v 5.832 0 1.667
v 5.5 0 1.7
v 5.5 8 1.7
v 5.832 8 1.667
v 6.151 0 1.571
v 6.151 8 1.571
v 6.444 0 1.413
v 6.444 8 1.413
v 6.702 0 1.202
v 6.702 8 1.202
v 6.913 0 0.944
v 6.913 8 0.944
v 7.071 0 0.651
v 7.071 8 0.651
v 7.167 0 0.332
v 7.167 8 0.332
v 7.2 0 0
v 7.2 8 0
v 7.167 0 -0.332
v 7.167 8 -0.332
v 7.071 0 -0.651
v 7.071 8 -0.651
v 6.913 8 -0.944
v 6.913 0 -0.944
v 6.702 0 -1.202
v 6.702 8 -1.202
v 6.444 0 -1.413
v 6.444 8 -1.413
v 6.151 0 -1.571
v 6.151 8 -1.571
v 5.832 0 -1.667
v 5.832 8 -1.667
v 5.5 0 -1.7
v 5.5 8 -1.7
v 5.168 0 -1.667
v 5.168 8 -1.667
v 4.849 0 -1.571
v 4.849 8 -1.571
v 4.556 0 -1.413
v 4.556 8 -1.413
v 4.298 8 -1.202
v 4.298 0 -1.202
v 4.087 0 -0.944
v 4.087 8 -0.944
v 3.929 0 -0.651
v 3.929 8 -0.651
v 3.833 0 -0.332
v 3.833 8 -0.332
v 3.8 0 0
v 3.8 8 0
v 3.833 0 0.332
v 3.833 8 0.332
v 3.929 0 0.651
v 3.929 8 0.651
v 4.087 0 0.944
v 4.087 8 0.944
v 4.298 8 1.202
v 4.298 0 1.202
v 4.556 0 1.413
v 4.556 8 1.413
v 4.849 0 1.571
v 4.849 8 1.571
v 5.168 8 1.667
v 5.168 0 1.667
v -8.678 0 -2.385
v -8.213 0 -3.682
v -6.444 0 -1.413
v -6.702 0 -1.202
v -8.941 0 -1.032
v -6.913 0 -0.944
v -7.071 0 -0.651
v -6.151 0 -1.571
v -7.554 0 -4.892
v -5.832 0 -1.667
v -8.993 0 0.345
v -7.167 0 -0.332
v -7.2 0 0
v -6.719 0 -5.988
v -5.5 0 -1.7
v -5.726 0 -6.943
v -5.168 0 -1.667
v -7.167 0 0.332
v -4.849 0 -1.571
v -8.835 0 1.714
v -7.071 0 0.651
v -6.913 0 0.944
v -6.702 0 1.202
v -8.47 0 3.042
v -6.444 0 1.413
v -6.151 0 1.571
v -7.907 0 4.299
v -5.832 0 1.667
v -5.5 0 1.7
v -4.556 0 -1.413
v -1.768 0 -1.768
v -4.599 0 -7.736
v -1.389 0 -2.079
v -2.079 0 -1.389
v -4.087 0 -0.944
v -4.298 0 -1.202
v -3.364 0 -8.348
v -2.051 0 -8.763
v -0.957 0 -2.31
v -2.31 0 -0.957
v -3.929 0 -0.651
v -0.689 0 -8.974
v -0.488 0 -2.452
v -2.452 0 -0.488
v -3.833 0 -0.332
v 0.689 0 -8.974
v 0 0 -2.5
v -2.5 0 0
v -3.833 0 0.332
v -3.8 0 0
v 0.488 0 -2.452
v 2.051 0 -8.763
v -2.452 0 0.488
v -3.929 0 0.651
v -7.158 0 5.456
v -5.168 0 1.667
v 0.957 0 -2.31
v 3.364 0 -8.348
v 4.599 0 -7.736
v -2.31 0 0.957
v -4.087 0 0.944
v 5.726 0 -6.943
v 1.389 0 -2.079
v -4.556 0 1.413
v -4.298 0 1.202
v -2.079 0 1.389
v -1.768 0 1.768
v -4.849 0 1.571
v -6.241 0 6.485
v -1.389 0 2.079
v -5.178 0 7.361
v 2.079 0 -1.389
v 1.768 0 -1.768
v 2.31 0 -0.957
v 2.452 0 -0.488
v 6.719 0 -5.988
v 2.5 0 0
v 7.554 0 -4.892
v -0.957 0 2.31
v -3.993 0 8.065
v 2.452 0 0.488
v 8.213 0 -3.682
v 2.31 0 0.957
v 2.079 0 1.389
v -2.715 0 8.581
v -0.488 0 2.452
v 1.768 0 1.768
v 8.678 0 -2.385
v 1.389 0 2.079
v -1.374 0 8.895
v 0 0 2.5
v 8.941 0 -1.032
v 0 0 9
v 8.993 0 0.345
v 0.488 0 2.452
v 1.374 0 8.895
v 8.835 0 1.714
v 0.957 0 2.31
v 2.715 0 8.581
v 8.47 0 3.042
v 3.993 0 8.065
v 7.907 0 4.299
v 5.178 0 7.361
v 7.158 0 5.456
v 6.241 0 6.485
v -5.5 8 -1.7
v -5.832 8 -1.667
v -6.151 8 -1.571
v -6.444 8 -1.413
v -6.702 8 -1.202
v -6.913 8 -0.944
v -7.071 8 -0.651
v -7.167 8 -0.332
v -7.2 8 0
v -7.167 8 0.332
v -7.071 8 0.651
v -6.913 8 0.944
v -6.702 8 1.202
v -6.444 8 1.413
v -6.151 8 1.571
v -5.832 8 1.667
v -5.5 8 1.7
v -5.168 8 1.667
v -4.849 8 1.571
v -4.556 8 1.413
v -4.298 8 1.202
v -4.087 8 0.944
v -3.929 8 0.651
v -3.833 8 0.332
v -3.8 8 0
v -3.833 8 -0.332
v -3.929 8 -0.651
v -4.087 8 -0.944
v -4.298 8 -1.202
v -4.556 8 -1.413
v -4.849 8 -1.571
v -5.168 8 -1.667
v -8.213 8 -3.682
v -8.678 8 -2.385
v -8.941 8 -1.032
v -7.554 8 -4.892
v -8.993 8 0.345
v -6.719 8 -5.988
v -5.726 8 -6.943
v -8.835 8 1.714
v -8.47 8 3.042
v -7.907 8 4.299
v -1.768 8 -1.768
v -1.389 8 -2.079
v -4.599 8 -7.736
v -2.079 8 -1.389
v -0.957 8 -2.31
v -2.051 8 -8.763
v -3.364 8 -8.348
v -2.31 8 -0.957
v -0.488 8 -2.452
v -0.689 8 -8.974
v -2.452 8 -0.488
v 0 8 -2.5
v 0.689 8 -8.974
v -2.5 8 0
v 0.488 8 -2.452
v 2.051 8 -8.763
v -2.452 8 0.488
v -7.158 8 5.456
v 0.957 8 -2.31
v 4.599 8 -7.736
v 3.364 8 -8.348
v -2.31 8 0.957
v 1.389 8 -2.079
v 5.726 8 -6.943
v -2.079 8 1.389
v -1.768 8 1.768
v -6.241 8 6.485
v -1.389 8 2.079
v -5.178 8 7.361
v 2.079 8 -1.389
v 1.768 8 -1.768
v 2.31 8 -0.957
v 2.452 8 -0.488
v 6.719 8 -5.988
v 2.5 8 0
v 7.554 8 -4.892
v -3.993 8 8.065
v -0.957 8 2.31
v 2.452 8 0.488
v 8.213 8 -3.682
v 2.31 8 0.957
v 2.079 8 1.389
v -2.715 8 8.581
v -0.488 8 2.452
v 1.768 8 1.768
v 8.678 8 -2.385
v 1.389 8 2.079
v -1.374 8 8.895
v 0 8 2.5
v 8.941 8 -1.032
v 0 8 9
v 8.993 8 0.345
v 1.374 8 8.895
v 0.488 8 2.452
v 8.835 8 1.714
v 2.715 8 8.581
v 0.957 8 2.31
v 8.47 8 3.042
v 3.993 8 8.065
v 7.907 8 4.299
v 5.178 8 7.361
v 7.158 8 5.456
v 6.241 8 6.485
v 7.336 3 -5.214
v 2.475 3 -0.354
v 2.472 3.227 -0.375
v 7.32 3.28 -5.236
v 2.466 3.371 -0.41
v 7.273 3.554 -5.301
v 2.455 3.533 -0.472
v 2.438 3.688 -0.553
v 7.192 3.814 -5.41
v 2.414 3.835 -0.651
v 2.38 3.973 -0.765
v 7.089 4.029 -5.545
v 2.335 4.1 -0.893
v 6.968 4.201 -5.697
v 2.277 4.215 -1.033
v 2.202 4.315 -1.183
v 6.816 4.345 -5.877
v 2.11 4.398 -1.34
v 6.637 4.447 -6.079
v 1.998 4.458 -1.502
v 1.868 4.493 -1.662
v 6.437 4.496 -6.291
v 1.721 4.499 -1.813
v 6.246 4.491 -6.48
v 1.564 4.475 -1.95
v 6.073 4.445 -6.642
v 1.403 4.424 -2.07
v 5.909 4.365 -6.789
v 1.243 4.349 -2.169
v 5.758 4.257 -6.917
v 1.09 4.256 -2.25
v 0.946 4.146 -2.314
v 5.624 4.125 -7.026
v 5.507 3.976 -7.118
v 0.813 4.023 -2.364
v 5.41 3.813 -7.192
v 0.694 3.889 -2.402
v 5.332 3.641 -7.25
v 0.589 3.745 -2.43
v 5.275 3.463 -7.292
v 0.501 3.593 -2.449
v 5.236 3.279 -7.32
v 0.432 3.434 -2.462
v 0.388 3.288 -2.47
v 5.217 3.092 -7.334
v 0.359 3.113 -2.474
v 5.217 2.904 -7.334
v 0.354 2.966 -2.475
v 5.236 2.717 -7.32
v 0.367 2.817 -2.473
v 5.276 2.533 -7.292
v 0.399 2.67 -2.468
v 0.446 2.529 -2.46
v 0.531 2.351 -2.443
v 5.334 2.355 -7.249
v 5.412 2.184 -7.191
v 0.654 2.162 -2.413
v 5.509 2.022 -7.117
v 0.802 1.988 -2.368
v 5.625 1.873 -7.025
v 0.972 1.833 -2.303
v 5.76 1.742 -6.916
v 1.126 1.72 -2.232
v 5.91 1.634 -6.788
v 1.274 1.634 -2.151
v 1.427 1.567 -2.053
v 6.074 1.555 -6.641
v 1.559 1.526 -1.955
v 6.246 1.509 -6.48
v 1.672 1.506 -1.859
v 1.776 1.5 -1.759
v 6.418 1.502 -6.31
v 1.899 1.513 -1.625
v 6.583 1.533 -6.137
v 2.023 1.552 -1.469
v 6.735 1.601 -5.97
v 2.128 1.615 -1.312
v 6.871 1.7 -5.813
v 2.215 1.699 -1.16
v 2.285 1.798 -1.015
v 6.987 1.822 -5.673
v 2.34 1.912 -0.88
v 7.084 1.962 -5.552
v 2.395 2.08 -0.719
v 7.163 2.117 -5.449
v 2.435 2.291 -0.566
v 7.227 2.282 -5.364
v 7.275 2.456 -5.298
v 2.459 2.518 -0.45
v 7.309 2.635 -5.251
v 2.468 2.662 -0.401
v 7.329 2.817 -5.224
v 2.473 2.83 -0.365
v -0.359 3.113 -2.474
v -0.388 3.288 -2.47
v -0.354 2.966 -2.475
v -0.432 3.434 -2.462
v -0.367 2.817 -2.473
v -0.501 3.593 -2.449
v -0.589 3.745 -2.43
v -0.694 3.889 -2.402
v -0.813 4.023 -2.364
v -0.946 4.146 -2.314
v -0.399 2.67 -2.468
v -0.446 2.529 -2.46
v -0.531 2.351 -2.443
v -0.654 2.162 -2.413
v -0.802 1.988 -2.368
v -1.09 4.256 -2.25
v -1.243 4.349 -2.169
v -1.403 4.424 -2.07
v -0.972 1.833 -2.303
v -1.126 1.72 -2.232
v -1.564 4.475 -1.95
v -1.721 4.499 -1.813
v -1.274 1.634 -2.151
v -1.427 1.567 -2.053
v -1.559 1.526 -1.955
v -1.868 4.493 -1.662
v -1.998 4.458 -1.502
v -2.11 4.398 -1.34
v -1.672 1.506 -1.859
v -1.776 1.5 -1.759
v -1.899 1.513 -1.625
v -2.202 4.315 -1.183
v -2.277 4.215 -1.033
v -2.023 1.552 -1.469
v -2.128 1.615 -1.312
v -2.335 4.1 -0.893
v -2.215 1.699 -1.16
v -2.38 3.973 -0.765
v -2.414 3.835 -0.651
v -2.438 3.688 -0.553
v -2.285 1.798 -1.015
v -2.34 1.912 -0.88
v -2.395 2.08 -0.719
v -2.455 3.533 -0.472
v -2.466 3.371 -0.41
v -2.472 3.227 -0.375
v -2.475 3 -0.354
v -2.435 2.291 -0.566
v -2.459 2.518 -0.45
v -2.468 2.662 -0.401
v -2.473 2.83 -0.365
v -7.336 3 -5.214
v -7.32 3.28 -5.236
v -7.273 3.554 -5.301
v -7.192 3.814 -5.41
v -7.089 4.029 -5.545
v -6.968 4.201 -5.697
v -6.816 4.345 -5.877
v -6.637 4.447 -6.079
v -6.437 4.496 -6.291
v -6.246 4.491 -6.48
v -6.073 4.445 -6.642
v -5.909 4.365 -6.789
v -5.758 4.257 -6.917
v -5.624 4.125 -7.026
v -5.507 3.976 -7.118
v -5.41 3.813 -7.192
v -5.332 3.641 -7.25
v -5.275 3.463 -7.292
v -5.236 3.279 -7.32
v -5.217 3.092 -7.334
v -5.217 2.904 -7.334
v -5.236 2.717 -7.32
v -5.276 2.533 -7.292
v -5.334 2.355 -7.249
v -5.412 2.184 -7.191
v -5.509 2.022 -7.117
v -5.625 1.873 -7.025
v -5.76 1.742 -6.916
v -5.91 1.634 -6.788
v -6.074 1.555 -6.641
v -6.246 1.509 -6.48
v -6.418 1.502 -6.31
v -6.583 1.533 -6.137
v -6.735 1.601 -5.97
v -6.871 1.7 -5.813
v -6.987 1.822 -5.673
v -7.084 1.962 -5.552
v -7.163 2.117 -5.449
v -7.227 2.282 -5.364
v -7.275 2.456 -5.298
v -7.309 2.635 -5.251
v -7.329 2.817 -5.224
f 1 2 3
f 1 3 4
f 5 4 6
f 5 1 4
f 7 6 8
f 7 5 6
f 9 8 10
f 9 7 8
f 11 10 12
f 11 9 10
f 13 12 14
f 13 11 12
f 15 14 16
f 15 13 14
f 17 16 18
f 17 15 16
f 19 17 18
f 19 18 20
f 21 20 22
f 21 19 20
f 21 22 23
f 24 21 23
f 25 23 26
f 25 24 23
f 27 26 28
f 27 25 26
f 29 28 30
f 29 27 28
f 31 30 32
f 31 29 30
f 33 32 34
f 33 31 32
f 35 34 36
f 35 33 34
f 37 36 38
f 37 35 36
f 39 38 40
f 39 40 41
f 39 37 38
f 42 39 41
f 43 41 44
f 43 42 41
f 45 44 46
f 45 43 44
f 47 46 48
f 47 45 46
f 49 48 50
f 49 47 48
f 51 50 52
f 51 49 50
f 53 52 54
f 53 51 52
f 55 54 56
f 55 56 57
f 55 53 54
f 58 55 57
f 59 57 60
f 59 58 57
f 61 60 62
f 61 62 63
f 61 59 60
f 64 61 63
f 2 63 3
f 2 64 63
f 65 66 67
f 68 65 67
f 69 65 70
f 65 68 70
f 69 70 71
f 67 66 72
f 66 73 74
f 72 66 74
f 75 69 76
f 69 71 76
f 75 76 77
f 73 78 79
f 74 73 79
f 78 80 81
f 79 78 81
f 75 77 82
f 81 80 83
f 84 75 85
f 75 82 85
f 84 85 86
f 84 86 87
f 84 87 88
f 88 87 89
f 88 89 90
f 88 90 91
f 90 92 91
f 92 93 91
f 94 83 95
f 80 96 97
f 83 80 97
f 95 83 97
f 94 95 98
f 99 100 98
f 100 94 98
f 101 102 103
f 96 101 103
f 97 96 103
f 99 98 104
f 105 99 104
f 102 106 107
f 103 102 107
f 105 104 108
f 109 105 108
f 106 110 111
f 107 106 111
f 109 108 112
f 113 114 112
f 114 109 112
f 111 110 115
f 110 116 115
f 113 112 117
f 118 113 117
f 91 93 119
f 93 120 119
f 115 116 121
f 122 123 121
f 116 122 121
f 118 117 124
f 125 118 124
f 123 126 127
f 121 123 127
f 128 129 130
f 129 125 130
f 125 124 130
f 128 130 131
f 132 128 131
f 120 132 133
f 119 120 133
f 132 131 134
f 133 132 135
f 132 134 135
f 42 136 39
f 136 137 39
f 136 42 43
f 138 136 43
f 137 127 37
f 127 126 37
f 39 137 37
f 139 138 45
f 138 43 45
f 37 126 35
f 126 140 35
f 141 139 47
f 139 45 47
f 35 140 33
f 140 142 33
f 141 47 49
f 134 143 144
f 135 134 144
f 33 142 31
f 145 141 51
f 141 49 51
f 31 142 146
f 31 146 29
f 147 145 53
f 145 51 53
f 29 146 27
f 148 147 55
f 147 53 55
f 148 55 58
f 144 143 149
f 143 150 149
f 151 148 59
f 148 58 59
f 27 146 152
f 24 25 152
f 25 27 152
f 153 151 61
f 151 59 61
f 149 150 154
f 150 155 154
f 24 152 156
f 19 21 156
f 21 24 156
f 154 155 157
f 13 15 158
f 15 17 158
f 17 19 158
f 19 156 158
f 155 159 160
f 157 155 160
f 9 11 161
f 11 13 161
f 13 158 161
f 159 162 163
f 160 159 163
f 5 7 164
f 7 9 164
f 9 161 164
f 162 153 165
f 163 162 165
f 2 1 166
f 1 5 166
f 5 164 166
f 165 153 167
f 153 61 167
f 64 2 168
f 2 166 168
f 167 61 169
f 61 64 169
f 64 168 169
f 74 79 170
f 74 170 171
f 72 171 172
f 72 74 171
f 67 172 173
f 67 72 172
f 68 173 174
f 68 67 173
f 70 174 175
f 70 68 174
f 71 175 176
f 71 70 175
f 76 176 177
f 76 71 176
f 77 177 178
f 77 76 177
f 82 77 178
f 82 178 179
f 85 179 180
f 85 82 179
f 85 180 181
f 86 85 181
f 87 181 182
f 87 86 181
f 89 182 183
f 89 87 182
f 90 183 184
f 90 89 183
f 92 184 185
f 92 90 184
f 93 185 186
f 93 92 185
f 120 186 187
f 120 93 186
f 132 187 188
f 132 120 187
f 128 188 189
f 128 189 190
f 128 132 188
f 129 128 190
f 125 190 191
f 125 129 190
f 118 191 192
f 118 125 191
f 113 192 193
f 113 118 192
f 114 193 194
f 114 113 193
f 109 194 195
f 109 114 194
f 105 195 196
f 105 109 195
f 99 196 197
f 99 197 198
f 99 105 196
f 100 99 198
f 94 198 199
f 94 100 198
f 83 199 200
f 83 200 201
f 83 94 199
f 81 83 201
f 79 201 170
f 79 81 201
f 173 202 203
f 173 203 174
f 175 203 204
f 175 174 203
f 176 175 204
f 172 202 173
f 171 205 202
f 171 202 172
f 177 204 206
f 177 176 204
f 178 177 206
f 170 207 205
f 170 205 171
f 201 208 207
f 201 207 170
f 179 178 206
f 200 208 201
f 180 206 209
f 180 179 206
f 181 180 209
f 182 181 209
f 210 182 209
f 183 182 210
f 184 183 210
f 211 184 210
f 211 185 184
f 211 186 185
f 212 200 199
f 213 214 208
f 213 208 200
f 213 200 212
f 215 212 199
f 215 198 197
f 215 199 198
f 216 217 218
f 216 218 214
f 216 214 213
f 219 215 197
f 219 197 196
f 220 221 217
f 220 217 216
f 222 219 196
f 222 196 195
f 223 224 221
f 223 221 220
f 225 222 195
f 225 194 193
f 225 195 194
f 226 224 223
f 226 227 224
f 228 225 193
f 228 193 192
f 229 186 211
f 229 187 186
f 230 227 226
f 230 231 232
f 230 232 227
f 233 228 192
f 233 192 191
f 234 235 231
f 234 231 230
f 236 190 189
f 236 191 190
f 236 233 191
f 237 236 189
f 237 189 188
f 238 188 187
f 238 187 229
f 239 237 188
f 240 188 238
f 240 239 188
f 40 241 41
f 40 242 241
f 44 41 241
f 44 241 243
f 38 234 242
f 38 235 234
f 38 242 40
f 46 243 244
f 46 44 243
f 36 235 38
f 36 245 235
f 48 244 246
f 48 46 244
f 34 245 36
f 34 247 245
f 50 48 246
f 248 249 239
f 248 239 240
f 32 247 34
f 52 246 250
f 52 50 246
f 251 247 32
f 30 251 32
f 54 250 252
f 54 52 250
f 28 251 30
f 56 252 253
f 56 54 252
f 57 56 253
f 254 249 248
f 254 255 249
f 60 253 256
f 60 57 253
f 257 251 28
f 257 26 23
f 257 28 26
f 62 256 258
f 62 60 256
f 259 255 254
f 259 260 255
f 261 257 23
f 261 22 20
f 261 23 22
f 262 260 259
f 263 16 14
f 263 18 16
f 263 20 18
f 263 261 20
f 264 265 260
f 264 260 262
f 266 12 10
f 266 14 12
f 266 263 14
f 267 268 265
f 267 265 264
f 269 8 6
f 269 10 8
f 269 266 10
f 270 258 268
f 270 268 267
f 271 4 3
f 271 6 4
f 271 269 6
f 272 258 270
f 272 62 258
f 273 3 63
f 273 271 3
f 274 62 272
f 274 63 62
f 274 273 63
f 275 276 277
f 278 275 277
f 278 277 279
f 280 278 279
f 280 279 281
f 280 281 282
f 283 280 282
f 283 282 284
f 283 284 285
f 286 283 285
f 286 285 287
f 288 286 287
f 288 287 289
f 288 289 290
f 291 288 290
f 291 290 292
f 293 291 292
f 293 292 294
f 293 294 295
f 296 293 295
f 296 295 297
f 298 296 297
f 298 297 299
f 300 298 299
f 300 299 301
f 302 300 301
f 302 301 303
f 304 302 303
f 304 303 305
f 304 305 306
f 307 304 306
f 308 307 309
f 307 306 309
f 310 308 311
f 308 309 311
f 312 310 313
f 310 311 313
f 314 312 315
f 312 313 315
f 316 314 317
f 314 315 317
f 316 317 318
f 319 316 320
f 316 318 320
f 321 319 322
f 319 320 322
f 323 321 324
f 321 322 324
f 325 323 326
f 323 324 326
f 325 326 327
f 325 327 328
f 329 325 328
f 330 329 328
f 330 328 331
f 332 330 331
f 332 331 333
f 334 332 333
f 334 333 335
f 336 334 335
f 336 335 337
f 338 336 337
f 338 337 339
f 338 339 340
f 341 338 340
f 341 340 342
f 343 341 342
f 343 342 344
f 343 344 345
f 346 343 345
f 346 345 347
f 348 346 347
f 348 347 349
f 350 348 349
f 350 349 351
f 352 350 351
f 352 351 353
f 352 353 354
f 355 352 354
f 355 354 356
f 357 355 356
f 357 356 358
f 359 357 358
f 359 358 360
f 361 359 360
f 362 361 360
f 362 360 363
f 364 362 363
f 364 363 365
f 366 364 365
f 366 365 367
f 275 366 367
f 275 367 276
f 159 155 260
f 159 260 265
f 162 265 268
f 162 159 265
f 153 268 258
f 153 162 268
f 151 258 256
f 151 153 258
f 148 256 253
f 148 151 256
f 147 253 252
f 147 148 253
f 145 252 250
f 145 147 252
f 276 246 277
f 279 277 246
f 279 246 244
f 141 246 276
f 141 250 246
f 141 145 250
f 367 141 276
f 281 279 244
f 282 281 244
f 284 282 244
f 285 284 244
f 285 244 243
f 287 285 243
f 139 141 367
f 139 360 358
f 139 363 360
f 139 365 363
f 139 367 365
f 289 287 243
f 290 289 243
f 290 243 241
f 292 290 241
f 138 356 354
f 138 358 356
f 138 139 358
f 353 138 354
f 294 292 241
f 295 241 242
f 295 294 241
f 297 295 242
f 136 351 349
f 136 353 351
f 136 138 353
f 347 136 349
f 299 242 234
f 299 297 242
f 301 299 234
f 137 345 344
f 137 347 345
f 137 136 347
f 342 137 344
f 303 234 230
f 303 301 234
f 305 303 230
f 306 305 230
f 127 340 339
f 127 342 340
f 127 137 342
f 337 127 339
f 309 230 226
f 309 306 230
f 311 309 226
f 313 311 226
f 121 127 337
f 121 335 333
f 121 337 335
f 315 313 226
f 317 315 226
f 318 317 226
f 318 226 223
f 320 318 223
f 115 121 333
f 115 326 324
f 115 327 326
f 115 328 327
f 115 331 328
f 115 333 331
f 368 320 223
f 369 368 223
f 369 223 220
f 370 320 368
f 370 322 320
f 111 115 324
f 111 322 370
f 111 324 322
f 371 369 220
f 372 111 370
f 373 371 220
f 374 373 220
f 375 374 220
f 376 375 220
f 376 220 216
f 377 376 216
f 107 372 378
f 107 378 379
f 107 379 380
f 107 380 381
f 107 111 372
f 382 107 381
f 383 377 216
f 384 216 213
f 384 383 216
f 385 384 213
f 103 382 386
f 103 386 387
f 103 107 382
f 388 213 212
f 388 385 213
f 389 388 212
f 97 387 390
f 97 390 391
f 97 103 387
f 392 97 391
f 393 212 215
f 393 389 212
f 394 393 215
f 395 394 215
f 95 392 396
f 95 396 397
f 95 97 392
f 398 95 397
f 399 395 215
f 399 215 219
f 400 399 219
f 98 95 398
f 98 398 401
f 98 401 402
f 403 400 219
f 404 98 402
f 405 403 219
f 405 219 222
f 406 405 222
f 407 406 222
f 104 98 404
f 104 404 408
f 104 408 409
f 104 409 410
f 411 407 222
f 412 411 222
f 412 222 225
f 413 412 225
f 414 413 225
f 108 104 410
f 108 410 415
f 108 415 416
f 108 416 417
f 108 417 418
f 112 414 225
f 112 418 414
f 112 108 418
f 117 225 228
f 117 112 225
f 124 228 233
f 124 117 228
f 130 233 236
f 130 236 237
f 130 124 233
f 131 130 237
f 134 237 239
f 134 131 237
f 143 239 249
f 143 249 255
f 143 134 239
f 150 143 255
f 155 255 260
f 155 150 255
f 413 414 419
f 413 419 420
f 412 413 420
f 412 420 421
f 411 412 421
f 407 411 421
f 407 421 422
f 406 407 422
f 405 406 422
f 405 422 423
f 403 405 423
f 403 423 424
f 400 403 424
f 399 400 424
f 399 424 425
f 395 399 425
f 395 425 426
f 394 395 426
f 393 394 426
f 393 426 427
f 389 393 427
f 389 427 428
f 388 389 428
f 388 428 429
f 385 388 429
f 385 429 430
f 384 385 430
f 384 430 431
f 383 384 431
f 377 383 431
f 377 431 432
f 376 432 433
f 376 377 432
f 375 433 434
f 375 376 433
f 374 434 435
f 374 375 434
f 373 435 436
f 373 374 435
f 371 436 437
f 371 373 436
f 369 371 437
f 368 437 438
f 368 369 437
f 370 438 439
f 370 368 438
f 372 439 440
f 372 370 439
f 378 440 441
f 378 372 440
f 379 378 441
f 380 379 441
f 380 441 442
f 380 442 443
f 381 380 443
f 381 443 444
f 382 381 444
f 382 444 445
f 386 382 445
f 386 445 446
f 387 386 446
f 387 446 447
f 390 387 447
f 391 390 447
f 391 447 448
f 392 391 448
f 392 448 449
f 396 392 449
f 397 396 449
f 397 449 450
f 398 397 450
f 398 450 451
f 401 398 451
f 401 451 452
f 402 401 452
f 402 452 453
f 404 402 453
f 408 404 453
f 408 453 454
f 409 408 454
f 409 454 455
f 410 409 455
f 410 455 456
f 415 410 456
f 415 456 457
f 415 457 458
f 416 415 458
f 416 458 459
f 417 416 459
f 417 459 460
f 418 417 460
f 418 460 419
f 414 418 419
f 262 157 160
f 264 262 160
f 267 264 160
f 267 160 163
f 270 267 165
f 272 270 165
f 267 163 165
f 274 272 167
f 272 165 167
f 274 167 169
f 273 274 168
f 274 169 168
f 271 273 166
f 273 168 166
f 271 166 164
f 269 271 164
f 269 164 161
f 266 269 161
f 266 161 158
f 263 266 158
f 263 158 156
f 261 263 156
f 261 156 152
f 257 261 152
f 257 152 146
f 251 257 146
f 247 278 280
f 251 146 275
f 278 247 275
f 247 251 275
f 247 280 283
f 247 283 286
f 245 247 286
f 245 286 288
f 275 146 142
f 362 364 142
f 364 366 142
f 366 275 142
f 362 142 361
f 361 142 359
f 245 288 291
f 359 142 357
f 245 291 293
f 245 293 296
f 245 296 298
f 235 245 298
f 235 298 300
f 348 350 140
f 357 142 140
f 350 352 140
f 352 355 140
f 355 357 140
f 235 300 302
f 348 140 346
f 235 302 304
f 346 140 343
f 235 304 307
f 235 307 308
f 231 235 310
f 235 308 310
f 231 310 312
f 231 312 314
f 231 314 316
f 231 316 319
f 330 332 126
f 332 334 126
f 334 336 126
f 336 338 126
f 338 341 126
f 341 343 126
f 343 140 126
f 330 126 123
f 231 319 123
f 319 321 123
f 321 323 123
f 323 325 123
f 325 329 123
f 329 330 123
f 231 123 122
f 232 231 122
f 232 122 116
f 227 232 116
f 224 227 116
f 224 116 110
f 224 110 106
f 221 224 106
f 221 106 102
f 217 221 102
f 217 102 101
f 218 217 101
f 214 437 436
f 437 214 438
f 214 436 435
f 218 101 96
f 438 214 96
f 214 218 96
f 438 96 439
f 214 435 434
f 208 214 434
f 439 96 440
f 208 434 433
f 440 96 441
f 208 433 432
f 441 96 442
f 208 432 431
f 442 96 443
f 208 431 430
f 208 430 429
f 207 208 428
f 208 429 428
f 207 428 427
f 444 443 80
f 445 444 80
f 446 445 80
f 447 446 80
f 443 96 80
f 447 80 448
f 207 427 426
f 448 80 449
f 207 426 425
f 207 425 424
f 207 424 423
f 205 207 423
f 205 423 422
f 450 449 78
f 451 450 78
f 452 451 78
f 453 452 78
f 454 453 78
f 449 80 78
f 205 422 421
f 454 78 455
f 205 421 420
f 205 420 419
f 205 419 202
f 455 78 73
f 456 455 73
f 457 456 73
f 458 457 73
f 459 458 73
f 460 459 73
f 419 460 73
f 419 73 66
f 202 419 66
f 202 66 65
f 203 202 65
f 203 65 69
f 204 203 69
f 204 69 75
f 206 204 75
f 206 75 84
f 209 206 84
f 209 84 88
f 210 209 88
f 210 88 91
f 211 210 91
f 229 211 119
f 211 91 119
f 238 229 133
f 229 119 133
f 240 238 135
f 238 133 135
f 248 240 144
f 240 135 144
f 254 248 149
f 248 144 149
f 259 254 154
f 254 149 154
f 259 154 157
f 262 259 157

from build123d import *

# Parameters (mm, degrees)
SKETCH1_R           = 9
SKETCH1_R_2         = 2.5
SKETCH1_R_3         = 1.7
BOSS_EXTRUDE1_DEPTH = 8
SKETCH2_R           = 1.5
CUT_EXTRUDE1_DEPTH  = 16.033296378


with BuildPart() as part:
    # Sketch1 → Boss-Extrude1 (new body)
    with BuildSketch(Plane(origin=(0, 0, 0), x_dir=(1, 0, 0), z_dir=(0, 1, 0))):
        Circle(SKETCH1_R)
        Circle(SKETCH1_R_2, mode=Mode.SUBTRACT)
        with Locations((5.5, 0)):
            Circle(SKETCH1_R_3, mode=Mode.SUBTRACT)
        with Locations((-5.5, 0)):
            Circle(SKETCH1_R_3, mode=Mode.SUBTRACT)
    extrude(amount=BOSS_EXTRUDE1_DEPTH)

    # Sketch2 → Cut-Extrude1 (cut, through all)
    with BuildSketch(Plane(origin=(0, 0, 0), x_dir=(0, -1, 0), z_dir=(-0.7071067811865488, 0, 0.7071067811865464))):
        with Locations((-3, 0)):
            Circle(SKETCH2_R)
    cut_extrude1 = extrude(amount=-CUT_EXTRUDE1_DEPTH, mode=Mode.SUBTRACT)

    # Mirror1: Cut-Extrude1 across plane
    add(cut_extrude1.mirror(Plane(origin=(0, 0, 0), x_dir=(0, 0, 1), z_dir=(1, 0, 0))), mode=Mode.SUBTRACT)


solid = part.part
